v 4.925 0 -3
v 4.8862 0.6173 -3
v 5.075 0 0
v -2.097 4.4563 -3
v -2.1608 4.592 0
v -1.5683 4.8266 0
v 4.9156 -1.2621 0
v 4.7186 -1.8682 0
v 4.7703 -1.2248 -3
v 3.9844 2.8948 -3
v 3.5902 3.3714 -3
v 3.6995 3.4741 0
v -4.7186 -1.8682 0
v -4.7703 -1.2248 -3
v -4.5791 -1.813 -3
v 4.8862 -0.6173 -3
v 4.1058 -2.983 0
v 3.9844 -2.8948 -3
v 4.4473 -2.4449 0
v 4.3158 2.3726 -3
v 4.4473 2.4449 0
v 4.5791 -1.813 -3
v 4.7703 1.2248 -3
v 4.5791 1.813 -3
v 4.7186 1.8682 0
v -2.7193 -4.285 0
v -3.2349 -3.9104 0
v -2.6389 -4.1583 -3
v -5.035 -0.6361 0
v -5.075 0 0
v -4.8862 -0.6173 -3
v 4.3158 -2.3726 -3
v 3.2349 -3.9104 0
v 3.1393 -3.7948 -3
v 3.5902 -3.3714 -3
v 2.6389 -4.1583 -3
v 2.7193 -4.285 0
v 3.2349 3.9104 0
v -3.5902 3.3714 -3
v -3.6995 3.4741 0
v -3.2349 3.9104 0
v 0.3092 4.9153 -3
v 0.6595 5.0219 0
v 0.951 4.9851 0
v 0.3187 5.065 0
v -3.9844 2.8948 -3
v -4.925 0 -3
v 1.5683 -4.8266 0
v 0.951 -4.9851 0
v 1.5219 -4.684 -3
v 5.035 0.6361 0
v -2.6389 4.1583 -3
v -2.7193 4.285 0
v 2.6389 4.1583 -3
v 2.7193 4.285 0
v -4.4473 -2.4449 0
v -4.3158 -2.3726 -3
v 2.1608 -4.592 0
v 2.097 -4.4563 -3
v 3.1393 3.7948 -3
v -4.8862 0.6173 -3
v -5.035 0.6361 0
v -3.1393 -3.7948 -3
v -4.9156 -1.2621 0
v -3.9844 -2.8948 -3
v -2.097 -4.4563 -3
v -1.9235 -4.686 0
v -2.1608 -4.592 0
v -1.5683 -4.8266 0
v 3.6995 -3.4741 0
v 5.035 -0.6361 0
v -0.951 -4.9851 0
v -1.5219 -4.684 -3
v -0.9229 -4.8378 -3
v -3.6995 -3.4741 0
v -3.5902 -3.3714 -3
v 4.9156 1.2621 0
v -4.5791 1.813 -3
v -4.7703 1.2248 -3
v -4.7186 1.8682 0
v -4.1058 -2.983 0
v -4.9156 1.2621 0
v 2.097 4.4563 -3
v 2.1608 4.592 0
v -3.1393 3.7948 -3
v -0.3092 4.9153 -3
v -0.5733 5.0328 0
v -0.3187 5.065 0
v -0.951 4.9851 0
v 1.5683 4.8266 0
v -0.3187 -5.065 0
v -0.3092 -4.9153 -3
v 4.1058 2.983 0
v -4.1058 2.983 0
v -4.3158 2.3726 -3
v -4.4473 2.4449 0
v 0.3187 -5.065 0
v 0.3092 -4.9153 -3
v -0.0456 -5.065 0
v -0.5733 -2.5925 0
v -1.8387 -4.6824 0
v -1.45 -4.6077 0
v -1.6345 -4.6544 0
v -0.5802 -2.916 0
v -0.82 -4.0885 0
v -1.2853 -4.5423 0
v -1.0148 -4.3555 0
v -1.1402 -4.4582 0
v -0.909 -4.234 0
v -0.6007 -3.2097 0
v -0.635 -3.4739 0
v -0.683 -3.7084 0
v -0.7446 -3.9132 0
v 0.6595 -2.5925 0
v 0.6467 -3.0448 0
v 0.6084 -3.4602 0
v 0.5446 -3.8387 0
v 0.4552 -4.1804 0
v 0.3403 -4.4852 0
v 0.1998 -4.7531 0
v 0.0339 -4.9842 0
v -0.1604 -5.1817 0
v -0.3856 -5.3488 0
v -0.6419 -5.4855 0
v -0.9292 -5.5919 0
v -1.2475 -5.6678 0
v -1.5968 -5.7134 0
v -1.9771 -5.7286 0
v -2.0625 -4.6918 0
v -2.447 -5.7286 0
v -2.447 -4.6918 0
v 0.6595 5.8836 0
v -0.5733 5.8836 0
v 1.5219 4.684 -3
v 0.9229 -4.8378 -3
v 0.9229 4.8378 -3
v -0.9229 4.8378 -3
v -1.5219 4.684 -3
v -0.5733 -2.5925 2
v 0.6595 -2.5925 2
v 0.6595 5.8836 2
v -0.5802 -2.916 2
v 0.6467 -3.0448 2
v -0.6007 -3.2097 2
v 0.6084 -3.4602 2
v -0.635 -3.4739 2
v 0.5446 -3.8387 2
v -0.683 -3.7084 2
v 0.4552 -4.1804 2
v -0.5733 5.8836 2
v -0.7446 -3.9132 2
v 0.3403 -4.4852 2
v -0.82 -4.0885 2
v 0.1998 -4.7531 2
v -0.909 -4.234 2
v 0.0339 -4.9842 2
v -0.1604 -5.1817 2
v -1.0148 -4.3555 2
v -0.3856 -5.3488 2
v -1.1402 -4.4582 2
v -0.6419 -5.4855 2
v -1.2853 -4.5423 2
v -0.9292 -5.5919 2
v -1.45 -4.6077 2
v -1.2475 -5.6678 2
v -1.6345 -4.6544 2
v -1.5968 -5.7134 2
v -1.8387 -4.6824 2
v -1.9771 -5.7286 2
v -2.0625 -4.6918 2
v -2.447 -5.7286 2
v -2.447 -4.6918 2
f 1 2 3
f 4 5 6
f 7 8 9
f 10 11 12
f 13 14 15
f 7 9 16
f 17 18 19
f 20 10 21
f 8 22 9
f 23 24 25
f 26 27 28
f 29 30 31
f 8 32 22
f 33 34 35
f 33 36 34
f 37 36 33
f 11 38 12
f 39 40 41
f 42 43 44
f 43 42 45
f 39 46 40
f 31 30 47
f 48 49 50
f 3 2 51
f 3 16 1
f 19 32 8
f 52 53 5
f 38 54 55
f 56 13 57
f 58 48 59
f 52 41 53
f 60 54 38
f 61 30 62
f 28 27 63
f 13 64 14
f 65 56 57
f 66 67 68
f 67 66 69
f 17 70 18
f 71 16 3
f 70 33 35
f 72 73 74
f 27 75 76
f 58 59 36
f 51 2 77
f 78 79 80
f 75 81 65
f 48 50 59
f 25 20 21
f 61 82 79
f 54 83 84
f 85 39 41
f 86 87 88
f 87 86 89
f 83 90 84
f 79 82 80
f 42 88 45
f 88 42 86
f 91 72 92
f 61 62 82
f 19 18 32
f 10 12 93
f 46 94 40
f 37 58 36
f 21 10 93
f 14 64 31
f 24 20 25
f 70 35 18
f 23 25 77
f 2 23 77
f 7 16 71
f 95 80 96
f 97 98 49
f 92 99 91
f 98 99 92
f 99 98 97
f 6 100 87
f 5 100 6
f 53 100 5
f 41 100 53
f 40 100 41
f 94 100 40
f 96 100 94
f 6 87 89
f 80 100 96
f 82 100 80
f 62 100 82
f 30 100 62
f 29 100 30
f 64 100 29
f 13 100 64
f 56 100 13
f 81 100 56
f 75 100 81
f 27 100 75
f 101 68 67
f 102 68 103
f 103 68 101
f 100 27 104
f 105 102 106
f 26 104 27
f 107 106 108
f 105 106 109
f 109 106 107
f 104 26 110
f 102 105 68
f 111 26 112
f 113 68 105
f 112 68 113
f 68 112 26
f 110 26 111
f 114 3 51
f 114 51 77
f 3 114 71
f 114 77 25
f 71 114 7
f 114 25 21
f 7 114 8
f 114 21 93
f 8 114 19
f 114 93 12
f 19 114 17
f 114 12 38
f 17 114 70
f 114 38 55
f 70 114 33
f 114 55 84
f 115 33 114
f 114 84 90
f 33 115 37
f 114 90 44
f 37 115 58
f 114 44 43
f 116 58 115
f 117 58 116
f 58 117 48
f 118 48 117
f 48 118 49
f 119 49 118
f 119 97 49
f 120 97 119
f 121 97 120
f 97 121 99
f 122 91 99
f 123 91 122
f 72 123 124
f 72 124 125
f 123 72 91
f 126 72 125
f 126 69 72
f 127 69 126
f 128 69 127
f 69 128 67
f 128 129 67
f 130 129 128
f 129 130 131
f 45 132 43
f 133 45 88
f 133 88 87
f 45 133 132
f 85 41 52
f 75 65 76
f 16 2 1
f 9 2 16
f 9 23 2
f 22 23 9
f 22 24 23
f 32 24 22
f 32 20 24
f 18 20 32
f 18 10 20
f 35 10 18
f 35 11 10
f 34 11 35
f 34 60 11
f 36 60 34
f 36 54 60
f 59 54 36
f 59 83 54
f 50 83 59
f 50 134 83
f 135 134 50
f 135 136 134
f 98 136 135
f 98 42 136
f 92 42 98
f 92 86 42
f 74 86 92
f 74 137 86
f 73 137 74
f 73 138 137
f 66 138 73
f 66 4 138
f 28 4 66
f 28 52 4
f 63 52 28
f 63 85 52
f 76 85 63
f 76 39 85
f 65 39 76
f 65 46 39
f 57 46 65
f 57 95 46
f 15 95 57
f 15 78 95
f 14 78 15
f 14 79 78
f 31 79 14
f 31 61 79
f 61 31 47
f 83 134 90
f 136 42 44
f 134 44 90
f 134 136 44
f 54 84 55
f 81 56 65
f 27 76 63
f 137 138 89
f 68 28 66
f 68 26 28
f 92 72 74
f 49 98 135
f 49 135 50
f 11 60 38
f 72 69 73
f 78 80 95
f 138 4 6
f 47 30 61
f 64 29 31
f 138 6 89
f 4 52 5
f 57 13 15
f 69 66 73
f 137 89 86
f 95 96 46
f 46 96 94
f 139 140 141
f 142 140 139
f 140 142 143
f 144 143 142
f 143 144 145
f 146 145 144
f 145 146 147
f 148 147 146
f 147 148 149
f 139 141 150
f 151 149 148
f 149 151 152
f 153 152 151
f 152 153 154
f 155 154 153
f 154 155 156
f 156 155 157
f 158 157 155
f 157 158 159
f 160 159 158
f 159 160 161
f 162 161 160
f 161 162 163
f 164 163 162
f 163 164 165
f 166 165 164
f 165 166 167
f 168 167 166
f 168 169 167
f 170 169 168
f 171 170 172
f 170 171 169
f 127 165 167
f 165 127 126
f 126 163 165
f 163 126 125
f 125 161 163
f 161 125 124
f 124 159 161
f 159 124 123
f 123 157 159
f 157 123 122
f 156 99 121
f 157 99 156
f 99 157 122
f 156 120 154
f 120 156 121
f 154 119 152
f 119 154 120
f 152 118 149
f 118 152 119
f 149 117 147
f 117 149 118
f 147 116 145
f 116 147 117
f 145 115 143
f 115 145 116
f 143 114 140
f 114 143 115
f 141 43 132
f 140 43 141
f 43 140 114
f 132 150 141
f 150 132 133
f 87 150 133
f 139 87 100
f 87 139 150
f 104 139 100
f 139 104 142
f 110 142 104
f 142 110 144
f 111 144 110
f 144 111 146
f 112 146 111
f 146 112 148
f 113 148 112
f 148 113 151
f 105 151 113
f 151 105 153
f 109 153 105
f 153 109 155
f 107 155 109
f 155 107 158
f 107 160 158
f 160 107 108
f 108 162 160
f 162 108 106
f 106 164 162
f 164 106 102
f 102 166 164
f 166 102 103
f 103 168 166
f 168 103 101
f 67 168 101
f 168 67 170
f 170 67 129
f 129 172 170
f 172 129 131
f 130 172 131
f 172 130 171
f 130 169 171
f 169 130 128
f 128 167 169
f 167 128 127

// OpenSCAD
$fn = 50;


difference() {
	union() {
		translate(v = [0, 0, -3.0000000000]) {
			cylinder(h = 3, r1 = 4.9250000000, r2 = 5.0750000000);
		}
		linear_extrude(height = 2) {
			text(font = "Wingdings", halign = "center", size = 9, text = "J", valign = "center");
		}
	}
	union();
}
